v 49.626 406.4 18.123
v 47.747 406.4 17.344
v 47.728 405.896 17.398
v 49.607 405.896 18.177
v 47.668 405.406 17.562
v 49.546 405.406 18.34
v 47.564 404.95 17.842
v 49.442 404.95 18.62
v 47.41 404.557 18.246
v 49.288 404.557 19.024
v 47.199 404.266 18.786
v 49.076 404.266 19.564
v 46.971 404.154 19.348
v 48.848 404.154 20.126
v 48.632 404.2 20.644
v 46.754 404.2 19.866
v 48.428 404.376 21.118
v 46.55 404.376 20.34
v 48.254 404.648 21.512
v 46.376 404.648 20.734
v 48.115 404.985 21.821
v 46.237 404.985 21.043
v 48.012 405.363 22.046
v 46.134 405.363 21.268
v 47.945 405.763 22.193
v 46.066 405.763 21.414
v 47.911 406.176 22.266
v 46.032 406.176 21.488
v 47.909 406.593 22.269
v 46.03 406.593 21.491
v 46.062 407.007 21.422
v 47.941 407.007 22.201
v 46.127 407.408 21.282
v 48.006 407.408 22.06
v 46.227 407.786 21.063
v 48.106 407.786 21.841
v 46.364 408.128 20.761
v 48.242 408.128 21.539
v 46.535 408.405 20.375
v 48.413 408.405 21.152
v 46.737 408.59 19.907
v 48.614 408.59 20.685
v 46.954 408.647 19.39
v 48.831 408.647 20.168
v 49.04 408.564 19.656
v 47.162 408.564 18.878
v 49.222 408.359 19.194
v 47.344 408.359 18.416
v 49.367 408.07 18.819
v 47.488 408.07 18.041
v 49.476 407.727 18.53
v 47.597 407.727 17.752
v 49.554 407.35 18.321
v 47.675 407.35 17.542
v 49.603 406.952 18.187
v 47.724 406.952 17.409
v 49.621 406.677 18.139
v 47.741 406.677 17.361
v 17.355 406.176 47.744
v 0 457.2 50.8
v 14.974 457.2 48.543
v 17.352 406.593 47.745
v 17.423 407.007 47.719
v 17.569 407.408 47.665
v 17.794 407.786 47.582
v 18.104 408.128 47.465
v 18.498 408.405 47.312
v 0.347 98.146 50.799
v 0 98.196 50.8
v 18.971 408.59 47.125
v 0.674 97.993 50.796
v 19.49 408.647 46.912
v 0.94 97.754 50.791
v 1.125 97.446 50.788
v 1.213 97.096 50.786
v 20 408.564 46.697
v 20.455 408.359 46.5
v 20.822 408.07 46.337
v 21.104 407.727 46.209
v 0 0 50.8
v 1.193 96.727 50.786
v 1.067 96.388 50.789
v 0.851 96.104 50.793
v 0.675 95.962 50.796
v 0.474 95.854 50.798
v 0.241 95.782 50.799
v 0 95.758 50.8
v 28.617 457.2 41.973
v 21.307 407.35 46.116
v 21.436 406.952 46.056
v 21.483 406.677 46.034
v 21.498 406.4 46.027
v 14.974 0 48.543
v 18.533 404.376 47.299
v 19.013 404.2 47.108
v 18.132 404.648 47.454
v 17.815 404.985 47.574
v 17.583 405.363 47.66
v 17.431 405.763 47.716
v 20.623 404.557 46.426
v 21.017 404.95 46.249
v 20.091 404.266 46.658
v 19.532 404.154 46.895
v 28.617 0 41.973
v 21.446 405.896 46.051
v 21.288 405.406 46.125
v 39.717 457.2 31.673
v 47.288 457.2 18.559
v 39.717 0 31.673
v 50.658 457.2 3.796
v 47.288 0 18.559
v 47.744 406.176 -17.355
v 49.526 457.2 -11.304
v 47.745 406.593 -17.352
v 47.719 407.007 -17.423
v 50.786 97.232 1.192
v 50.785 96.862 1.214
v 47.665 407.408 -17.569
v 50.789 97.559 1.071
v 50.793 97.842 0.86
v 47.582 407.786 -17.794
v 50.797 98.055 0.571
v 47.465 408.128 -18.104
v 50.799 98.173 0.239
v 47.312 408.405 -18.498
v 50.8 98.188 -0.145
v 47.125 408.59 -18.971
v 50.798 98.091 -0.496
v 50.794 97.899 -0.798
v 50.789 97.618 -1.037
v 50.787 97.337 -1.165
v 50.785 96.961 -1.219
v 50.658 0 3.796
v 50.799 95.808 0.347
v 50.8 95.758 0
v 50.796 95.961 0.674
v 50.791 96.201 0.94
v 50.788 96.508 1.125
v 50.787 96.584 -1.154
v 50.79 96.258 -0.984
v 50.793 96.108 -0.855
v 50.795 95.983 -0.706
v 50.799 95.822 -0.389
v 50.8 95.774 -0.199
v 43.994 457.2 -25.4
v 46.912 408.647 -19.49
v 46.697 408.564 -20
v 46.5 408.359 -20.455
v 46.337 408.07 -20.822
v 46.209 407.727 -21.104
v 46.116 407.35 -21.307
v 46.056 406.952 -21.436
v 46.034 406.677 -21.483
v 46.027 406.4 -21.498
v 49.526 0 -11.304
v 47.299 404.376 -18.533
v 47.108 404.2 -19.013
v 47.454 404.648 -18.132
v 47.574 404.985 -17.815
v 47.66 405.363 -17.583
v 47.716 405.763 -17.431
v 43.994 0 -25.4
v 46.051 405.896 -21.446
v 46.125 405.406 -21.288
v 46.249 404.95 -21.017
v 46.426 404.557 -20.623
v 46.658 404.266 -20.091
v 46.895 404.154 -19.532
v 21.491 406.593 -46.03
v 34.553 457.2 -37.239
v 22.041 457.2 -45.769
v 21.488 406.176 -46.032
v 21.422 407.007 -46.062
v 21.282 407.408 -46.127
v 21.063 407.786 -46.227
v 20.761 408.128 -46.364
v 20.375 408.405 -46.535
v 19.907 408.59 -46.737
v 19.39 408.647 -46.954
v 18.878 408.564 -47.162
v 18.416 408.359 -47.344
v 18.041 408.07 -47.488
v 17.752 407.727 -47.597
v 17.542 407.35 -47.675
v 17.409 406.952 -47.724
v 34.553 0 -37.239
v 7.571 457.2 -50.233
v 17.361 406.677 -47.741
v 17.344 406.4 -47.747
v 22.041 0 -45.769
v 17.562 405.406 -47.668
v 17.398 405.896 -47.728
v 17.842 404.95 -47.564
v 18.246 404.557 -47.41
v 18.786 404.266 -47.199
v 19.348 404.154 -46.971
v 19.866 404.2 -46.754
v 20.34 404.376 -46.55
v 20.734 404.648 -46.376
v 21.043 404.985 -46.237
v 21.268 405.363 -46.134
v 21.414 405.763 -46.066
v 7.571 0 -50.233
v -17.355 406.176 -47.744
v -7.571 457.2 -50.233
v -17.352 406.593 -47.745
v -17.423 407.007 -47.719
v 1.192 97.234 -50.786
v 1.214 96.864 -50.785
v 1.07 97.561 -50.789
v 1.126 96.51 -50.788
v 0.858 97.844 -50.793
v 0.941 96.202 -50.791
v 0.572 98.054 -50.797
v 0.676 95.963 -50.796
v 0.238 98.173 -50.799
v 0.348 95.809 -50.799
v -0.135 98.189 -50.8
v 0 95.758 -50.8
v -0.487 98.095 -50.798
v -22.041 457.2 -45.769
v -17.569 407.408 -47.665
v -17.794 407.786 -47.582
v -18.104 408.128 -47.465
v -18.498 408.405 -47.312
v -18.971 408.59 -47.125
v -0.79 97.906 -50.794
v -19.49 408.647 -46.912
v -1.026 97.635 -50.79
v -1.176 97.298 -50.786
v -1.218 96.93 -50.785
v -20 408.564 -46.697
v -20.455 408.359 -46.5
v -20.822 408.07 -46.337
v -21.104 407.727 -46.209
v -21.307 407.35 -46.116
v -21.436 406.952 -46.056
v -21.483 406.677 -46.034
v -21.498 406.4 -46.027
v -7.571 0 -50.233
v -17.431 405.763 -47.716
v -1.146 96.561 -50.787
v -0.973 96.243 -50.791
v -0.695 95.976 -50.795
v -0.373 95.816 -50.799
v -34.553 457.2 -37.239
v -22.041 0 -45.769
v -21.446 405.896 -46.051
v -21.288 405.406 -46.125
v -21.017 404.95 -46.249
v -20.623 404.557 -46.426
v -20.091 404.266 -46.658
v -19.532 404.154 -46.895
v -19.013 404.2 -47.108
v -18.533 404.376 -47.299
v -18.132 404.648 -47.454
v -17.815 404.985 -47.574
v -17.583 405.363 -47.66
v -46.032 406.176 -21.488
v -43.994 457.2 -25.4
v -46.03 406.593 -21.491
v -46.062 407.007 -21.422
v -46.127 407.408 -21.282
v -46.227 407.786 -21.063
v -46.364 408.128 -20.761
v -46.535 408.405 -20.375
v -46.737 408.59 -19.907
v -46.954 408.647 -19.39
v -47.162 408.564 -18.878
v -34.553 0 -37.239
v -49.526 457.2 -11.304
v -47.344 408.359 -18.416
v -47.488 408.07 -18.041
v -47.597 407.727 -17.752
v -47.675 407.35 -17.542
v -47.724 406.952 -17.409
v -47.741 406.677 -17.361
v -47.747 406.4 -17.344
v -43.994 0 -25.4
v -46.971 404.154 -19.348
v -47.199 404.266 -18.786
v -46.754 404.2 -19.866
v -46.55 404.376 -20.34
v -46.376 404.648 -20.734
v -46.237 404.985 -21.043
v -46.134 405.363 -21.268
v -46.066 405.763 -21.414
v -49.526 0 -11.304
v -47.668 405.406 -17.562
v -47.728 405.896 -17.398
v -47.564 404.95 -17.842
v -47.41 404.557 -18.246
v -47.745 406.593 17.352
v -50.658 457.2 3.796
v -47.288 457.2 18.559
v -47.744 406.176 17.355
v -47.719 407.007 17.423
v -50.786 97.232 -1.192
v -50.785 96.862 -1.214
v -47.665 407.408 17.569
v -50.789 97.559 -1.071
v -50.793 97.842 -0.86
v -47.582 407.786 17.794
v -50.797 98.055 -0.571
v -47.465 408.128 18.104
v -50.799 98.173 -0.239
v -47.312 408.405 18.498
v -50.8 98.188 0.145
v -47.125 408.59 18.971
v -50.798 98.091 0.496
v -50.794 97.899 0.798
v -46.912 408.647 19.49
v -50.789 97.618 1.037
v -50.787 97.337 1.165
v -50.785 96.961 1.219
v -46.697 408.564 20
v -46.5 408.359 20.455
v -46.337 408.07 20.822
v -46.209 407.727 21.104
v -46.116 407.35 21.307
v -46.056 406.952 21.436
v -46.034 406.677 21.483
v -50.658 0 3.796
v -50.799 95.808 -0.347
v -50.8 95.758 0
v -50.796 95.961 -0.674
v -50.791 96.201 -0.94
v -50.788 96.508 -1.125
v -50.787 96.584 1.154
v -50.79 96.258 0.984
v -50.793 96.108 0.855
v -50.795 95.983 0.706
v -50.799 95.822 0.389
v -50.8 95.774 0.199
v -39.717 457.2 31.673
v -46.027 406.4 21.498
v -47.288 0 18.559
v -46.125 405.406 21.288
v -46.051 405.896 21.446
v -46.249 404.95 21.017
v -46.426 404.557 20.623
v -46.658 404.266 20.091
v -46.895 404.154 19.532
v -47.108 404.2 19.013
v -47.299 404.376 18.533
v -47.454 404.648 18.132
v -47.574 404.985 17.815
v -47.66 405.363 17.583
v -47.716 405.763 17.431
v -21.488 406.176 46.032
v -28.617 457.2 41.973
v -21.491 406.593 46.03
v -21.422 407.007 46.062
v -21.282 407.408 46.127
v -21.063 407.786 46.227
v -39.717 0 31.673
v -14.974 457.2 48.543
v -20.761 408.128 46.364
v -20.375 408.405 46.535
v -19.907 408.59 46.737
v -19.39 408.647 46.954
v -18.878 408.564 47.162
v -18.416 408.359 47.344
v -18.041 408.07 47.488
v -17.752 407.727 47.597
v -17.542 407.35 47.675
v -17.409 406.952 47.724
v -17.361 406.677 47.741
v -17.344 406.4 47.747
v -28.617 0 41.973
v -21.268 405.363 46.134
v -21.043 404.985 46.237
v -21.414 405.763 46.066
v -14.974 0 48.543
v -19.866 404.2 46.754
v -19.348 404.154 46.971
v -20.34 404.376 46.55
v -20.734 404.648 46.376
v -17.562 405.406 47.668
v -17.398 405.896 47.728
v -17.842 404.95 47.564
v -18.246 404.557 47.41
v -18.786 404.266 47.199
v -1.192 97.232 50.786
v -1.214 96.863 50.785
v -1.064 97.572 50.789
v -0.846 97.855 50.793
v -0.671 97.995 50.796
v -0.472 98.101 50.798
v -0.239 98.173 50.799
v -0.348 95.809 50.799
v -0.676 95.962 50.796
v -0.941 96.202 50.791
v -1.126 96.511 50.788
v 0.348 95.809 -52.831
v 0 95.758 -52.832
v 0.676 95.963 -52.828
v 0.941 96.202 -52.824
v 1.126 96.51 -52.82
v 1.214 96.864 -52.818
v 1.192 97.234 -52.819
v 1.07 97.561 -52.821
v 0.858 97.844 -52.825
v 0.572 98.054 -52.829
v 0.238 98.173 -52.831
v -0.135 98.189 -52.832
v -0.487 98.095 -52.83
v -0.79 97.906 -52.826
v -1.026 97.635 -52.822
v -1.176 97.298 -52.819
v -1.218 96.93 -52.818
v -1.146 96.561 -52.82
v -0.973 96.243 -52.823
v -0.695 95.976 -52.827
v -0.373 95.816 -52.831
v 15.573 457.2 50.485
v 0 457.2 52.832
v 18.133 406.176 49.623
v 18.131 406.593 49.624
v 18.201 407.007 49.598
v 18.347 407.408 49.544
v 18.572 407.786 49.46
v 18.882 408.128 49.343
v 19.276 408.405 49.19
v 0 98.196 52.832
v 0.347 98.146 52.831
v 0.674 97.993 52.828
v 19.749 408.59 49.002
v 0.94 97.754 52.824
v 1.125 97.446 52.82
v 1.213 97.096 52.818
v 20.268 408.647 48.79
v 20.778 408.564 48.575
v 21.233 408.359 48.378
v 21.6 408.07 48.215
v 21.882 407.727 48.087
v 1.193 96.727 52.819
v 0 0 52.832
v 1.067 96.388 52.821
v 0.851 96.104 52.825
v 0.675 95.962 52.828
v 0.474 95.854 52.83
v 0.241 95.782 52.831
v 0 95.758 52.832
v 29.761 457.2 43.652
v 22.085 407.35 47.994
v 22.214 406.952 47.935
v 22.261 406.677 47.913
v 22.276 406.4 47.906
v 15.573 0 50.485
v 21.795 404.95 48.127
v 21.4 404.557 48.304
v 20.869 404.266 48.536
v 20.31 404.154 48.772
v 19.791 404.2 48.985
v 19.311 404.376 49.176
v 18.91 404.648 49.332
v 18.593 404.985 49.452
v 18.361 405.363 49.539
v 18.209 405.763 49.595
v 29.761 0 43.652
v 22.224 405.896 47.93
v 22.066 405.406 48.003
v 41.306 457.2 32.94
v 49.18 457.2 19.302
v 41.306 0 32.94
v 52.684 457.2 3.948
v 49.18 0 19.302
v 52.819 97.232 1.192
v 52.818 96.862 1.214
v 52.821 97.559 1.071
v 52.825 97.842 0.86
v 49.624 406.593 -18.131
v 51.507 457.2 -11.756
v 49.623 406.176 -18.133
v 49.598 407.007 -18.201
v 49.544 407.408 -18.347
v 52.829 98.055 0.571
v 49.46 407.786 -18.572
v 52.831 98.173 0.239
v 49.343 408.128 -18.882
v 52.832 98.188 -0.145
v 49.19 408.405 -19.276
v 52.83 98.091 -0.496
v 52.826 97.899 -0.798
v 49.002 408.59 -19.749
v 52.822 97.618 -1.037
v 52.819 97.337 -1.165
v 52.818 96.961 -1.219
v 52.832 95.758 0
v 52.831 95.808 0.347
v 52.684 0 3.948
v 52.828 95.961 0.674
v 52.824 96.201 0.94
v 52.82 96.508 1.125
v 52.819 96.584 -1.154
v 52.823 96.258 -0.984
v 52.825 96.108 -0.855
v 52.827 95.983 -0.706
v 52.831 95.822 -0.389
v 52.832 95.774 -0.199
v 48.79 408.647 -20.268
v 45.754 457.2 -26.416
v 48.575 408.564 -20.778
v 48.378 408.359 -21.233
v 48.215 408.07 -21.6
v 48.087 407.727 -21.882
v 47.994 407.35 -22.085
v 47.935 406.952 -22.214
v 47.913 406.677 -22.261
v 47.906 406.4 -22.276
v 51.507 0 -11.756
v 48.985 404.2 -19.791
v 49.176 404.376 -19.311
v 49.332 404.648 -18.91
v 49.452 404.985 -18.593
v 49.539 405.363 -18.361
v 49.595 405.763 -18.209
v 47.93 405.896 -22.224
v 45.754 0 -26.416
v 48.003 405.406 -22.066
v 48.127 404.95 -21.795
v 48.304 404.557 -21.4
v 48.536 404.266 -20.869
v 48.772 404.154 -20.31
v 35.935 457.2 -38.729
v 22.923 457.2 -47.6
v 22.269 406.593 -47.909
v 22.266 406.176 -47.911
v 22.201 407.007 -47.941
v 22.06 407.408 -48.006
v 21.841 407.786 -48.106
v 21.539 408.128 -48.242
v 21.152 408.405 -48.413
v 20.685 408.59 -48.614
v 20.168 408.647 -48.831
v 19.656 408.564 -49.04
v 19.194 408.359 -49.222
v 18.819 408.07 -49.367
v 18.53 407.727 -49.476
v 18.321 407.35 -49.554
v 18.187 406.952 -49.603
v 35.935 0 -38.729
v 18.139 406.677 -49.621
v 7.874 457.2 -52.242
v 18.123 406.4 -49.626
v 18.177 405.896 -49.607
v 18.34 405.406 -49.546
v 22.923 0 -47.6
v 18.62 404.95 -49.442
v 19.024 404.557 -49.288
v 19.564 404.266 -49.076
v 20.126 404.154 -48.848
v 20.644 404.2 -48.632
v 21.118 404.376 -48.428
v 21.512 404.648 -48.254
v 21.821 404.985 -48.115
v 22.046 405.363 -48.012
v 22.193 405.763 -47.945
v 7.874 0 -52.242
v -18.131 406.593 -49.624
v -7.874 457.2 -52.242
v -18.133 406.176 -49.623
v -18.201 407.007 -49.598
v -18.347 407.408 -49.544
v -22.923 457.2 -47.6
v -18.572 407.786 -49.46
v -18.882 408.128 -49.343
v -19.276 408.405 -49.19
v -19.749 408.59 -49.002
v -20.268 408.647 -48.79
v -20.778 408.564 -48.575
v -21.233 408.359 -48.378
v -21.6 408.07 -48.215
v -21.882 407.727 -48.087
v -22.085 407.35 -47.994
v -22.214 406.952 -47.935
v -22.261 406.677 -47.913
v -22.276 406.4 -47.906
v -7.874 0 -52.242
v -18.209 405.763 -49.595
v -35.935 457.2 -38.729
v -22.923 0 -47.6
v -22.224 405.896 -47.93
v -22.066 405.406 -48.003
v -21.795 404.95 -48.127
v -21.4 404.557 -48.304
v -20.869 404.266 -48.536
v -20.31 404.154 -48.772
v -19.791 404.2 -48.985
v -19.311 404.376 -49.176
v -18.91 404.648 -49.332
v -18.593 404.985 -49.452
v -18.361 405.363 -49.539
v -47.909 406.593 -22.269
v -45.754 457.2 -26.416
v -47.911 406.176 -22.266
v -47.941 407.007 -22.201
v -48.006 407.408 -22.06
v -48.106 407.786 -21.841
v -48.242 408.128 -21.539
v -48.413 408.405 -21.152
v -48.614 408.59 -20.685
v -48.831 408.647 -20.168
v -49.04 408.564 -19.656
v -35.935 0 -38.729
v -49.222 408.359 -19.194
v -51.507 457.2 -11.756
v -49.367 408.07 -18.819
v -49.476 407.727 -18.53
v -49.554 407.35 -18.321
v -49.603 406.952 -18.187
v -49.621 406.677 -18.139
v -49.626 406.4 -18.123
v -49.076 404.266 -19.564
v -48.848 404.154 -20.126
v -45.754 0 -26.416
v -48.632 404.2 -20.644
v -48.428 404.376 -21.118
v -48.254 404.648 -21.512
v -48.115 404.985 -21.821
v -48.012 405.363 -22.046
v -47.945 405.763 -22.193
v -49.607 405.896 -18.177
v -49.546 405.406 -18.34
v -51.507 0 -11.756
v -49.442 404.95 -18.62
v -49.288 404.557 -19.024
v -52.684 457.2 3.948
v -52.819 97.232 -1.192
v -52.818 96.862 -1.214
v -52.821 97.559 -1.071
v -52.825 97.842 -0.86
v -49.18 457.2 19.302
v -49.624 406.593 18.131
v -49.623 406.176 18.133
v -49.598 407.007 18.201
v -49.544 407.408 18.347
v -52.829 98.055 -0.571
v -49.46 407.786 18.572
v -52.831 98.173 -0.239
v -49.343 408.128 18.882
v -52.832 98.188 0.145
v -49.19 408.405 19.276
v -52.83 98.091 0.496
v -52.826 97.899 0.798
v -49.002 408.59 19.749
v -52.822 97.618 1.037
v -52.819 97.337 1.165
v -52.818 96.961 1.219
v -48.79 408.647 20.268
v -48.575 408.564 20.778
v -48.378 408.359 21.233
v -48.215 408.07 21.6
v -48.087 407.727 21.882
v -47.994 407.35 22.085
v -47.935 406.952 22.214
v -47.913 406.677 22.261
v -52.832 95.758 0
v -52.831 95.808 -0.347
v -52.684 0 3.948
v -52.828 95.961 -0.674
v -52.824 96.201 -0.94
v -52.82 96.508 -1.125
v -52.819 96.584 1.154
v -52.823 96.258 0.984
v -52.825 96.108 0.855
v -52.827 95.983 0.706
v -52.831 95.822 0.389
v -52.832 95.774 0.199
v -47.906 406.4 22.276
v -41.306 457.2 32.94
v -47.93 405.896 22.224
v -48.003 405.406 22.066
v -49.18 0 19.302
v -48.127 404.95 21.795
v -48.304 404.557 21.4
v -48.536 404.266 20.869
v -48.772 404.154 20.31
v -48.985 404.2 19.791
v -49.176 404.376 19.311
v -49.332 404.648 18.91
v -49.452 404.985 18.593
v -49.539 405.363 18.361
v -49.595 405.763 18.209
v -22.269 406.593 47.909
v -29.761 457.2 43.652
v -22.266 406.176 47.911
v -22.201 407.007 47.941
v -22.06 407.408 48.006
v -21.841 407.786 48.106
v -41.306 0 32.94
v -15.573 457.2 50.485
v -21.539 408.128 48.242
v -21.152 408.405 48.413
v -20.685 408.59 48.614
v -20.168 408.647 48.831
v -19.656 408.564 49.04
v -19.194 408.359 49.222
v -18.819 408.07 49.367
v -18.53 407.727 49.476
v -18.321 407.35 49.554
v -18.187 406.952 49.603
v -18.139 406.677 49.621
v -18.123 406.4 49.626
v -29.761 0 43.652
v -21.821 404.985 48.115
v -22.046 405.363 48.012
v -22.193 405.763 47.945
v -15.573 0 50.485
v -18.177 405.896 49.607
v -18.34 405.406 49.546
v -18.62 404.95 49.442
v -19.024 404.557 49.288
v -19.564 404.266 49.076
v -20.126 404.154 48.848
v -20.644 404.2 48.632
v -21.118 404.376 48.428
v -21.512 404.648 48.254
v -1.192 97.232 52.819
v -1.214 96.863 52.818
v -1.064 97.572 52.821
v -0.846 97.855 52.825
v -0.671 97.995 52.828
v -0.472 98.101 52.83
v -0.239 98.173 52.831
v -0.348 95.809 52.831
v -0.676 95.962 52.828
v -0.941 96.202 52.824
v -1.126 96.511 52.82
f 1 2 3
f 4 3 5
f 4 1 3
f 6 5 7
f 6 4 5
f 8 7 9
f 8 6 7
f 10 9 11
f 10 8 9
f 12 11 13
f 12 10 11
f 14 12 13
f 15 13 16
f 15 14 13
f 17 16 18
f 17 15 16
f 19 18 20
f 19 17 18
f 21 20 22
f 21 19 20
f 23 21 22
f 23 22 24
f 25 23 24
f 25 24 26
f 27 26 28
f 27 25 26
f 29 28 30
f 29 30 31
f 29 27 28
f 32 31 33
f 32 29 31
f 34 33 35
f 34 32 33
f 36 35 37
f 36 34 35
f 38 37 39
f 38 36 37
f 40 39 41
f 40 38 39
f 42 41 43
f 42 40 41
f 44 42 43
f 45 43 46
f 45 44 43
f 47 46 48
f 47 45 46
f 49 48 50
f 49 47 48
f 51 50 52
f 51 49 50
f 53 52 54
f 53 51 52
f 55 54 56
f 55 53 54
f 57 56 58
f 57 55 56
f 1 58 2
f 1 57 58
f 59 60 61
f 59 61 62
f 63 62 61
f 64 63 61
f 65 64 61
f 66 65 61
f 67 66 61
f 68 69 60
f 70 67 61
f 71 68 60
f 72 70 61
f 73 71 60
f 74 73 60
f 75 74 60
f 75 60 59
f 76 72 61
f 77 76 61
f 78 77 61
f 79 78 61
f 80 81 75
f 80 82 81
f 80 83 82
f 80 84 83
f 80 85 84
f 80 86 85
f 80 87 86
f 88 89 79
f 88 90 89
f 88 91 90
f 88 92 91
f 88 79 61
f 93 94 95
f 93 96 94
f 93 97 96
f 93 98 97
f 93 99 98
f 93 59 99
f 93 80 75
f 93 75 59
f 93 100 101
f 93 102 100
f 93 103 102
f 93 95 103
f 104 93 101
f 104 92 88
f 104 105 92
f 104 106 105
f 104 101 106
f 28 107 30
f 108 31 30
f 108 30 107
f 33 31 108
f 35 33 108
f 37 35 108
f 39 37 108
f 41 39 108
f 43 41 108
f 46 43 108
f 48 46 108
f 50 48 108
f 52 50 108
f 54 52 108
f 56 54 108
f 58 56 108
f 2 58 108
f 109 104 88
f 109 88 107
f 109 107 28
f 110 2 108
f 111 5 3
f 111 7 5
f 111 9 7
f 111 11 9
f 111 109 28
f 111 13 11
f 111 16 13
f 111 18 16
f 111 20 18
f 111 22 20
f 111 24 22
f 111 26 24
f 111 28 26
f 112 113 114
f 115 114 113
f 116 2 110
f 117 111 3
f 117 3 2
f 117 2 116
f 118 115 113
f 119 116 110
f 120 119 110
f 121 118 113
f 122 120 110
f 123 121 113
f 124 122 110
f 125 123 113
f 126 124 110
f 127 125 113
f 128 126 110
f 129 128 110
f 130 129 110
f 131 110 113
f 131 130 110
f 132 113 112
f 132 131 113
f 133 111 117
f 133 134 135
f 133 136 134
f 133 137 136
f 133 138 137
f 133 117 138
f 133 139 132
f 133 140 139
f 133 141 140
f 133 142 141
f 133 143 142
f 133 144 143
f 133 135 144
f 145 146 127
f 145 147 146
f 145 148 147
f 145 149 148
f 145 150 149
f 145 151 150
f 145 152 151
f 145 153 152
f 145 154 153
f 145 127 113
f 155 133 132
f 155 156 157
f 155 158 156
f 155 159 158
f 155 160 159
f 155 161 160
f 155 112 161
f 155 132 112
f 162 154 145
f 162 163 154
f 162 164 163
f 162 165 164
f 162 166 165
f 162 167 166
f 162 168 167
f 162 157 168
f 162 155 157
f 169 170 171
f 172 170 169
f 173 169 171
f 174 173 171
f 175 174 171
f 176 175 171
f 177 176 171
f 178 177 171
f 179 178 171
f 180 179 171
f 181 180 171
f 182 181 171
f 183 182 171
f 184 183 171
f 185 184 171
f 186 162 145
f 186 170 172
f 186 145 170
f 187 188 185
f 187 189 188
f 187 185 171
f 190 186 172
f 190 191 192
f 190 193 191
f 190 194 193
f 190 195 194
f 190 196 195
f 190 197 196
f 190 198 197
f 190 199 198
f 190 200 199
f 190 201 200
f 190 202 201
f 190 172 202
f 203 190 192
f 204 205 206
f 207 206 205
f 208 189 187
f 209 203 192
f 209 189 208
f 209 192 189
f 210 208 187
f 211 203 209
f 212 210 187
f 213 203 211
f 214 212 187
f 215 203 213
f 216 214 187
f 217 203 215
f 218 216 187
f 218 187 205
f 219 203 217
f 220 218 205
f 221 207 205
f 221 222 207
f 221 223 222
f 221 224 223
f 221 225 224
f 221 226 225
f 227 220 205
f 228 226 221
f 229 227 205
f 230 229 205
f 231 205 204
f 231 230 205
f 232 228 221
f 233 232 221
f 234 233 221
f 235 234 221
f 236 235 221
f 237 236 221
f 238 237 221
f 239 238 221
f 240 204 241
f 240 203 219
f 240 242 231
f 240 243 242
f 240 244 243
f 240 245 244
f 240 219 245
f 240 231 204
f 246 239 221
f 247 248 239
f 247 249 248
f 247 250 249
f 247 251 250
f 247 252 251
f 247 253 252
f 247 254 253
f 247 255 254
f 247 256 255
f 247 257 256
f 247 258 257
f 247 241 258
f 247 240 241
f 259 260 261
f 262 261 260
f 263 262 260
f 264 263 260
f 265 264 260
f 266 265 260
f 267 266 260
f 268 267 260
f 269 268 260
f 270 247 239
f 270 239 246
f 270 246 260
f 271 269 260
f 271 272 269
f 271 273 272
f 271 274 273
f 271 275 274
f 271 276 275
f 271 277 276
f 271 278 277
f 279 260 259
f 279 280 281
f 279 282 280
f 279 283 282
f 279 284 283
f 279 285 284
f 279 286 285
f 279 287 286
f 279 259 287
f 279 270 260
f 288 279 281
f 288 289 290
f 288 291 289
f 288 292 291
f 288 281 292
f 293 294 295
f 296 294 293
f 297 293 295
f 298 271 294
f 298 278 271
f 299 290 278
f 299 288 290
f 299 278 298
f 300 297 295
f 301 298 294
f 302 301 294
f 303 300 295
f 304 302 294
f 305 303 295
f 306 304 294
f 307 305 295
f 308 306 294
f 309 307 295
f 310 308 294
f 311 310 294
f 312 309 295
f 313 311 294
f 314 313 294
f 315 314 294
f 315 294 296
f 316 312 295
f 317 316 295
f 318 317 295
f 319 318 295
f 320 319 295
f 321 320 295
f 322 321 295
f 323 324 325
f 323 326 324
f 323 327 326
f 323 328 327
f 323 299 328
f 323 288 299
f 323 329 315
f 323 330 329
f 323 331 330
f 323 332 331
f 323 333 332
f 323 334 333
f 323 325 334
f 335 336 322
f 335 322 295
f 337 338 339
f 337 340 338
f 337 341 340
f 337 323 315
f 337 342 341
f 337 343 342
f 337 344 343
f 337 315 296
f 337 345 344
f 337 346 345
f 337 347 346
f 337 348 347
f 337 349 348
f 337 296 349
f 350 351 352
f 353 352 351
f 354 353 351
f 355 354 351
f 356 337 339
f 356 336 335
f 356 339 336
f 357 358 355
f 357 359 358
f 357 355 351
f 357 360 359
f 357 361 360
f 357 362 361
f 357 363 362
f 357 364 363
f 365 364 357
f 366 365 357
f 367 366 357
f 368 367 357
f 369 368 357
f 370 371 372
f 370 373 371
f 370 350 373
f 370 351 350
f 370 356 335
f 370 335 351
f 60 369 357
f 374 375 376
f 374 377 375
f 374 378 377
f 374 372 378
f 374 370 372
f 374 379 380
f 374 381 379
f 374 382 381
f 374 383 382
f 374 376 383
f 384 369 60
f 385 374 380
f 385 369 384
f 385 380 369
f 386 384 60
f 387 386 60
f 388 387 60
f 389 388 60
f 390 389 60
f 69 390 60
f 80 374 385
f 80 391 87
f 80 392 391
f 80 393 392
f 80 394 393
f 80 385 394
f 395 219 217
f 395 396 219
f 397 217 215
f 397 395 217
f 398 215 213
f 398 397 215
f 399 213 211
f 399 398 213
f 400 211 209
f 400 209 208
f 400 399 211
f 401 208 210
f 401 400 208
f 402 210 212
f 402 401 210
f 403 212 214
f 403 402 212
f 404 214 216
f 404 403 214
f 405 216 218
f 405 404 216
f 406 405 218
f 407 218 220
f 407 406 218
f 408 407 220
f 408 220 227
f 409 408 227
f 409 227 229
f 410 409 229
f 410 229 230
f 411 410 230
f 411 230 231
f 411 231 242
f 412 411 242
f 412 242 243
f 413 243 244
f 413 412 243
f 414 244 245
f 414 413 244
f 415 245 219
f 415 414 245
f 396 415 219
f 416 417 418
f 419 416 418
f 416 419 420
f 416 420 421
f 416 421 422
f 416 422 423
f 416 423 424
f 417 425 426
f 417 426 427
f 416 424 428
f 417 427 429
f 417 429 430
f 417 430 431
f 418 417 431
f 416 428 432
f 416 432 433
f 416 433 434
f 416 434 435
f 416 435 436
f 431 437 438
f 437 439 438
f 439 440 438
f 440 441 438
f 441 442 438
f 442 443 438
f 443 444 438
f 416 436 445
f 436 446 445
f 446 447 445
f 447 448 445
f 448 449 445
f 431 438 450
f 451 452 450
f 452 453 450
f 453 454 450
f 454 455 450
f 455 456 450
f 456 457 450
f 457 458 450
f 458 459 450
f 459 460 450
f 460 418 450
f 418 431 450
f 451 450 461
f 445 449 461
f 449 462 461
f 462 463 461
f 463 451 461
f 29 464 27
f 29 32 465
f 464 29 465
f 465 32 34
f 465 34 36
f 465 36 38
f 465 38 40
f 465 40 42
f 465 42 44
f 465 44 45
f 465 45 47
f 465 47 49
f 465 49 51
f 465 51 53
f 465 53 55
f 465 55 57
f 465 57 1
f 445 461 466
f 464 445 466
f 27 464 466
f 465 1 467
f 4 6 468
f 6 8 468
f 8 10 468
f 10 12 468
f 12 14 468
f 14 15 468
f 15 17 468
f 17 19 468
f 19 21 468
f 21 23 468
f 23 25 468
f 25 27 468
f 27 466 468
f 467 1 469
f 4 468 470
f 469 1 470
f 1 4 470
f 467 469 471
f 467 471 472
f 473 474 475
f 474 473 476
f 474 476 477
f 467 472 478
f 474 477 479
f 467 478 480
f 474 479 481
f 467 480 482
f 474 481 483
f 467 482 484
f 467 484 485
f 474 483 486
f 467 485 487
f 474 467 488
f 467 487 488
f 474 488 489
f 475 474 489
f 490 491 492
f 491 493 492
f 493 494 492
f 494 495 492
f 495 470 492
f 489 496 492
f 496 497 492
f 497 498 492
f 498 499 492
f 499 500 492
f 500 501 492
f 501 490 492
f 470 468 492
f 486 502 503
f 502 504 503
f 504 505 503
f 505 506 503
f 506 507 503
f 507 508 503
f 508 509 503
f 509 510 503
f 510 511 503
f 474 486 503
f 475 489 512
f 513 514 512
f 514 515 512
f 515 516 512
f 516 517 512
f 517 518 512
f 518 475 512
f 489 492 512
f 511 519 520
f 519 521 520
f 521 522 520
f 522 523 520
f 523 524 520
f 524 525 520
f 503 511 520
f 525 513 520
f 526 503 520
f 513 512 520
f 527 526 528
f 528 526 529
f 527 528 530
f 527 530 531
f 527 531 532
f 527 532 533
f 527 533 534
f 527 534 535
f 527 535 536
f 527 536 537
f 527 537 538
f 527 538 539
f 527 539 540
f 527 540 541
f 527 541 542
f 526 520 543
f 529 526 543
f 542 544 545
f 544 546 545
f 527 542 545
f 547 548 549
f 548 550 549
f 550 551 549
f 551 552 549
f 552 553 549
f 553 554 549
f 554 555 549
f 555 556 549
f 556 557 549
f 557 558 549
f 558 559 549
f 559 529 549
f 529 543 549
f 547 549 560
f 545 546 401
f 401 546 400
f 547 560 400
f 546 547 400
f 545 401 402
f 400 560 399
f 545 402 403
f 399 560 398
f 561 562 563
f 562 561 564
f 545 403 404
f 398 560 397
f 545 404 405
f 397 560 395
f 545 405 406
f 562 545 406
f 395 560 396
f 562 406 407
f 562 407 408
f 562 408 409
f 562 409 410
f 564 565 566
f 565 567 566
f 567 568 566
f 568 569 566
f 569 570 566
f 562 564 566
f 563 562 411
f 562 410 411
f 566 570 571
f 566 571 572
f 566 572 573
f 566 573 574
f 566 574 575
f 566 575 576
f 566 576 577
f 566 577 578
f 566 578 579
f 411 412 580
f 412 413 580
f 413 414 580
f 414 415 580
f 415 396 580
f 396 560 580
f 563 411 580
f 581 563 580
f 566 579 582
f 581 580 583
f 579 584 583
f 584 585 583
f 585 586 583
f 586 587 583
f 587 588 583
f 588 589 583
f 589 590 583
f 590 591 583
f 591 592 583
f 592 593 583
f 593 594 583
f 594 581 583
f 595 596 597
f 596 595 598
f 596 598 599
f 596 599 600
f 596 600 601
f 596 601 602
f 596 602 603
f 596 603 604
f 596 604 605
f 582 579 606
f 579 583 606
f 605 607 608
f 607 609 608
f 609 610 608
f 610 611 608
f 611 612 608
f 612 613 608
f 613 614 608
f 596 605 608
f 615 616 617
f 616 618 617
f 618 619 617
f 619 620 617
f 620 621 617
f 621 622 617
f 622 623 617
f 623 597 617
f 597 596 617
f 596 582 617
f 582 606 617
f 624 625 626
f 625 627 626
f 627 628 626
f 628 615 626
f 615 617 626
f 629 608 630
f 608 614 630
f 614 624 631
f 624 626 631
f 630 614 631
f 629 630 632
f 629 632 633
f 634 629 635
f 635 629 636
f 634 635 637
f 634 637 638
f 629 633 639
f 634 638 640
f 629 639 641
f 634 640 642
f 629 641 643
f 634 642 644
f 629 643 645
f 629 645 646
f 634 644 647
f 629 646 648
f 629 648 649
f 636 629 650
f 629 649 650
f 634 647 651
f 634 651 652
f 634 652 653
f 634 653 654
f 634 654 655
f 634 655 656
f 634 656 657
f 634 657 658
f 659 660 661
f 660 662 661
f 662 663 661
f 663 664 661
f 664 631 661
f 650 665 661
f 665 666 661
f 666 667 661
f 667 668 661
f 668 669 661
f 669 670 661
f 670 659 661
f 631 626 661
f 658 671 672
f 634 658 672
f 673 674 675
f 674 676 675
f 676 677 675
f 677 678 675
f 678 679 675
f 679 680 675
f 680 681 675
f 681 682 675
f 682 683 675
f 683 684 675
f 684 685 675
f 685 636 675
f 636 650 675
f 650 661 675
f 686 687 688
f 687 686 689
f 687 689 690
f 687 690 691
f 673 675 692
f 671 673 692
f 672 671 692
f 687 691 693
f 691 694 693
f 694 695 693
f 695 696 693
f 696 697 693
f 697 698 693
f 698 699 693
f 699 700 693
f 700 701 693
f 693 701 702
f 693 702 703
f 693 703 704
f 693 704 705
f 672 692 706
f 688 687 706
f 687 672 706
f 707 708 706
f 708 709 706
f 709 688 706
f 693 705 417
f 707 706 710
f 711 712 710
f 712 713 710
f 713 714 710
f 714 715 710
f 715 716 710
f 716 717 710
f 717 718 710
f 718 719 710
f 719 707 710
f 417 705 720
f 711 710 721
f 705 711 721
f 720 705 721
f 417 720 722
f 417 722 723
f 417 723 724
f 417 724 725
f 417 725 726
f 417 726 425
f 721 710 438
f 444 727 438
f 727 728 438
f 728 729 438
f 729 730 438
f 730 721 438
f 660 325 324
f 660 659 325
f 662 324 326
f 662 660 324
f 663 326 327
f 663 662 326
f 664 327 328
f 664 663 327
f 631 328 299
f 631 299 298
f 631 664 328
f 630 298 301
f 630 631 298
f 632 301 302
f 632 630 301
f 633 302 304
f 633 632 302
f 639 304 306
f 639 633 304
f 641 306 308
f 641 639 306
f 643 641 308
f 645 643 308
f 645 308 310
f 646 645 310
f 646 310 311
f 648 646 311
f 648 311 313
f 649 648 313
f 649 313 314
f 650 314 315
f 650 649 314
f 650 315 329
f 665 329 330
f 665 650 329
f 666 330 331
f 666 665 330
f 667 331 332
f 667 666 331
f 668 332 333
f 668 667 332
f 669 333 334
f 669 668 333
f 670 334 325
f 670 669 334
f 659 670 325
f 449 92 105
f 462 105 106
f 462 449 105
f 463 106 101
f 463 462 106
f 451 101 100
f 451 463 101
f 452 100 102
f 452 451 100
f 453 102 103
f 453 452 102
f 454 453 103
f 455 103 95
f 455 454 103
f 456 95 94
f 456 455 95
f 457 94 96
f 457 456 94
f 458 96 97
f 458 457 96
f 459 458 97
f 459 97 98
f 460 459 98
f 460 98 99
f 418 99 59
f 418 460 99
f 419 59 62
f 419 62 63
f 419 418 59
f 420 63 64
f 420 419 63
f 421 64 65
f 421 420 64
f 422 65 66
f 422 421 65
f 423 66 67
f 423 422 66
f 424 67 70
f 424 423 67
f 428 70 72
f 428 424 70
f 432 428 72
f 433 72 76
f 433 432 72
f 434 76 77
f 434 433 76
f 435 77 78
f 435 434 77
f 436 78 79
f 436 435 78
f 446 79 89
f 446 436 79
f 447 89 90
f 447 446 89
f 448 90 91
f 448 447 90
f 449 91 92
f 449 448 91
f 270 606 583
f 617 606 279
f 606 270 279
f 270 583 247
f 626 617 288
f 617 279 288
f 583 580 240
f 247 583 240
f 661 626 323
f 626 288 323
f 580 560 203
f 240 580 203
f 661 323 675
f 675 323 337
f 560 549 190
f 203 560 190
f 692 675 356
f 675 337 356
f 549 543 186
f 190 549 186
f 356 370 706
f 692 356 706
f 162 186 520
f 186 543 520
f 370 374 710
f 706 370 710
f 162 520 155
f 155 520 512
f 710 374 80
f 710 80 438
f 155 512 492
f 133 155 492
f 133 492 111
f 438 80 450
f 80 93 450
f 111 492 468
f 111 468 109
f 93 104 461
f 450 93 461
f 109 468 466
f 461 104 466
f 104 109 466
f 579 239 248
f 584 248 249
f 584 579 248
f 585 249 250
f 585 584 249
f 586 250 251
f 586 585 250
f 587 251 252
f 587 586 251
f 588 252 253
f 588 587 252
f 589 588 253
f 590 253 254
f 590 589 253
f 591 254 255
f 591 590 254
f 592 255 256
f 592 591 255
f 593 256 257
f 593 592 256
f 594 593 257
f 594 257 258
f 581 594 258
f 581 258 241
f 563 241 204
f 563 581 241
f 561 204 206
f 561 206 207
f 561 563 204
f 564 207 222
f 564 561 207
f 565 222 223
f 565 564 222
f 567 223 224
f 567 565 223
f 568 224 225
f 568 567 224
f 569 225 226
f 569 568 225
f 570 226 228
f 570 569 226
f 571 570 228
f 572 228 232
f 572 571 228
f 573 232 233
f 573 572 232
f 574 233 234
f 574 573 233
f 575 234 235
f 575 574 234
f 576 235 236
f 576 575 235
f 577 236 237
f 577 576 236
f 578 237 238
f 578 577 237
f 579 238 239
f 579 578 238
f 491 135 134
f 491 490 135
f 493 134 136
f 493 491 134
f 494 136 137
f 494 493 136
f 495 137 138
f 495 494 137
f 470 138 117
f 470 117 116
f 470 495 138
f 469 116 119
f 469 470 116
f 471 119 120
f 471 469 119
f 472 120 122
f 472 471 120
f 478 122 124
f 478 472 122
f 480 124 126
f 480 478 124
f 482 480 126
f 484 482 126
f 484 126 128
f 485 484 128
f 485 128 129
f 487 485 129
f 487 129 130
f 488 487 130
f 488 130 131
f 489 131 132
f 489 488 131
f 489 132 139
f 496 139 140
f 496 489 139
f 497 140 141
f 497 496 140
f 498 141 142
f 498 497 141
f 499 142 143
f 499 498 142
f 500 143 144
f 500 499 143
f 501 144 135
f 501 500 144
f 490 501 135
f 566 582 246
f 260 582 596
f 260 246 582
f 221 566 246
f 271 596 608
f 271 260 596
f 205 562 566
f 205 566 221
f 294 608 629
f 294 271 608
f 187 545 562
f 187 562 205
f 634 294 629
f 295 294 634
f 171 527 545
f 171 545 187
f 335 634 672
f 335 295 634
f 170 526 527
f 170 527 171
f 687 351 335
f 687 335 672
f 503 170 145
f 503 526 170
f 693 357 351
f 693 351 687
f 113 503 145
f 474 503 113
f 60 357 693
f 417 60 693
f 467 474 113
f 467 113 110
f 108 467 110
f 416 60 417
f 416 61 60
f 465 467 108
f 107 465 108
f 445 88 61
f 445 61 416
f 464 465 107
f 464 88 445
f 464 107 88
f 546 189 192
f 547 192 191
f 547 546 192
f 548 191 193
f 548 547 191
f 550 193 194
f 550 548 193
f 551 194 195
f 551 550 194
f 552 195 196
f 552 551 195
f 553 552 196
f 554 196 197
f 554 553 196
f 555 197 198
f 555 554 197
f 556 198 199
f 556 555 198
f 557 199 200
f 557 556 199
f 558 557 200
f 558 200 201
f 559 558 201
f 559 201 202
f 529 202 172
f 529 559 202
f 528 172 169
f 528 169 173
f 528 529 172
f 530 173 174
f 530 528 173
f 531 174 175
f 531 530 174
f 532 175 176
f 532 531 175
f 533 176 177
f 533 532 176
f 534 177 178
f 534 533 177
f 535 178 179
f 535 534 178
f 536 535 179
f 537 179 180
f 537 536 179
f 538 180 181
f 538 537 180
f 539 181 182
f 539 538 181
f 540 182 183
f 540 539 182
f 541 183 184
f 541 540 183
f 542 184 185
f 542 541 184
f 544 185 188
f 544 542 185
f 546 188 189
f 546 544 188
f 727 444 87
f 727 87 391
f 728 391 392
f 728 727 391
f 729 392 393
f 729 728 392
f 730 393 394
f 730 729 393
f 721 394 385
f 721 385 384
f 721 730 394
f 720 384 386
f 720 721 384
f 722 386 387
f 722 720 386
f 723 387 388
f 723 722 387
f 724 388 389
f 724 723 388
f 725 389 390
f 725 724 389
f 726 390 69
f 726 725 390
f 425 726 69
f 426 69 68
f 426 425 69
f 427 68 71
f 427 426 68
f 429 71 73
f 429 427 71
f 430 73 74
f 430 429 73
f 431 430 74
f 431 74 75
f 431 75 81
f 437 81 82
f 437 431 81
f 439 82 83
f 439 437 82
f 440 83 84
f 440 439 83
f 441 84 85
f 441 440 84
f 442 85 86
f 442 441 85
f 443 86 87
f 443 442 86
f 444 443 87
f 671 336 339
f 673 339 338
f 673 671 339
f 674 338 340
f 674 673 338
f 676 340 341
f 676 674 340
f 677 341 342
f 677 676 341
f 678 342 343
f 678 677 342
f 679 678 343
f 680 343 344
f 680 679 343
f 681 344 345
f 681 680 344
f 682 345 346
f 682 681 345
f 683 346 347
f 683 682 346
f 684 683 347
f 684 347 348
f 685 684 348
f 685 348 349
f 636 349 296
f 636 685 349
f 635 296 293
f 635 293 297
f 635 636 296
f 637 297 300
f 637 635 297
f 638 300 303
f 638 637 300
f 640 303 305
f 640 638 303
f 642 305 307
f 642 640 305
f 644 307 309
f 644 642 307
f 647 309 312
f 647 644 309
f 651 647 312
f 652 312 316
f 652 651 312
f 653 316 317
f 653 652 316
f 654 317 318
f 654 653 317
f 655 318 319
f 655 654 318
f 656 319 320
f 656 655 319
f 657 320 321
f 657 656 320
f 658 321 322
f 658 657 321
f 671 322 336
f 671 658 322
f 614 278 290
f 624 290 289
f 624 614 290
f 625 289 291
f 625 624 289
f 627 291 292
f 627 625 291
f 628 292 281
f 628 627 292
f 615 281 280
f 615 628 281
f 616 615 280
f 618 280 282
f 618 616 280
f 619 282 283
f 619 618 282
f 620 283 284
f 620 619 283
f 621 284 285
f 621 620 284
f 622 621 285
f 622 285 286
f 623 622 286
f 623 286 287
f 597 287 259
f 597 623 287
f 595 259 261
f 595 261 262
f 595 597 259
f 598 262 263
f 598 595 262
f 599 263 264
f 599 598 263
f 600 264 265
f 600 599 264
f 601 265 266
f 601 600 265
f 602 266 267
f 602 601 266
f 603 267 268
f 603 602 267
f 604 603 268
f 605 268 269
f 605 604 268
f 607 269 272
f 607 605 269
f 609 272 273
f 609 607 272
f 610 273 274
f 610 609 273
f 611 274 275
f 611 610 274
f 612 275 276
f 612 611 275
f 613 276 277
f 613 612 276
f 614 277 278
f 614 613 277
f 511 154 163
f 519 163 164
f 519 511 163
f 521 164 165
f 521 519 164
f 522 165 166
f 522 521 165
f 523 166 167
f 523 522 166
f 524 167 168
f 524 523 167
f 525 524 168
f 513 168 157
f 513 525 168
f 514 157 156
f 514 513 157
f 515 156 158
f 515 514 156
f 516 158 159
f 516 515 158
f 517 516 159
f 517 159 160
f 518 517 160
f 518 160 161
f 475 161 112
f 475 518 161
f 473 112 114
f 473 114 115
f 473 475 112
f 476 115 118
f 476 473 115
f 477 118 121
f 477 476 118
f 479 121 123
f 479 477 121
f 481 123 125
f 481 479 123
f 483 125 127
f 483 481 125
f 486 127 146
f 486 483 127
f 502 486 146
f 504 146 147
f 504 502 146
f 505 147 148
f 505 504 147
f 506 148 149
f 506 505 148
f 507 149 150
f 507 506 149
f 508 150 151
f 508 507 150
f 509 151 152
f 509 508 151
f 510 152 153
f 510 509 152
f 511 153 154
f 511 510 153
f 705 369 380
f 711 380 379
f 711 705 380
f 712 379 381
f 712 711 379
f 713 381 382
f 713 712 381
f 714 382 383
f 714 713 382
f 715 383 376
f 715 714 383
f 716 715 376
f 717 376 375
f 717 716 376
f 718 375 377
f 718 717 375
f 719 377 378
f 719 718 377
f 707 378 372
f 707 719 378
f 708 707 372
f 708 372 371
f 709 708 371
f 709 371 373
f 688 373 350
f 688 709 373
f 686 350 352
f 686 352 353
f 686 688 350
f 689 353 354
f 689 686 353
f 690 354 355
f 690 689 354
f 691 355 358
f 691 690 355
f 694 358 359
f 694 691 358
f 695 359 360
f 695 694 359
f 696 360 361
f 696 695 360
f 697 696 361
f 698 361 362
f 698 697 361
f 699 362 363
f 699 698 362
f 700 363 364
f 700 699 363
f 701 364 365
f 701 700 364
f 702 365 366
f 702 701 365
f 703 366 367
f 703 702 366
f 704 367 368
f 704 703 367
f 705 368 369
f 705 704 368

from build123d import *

# Parameters (mm, degrees)
SKETCH1_R           = 52.832
SKETCH1_R_2         = 50.8
BOSS_EXTRUDE1_DEPTH = 457.2
CIRPATTERN1_COUNT   = 4
CIRPATTERN2_COUNT   = 8


with BuildPart() as part:
    # Sketch1 → Boss-Extrude1 (new body)
    with BuildSketch(Plane(origin=(0, 0, 0), x_dir=(1, 0, 0), z_dir=(0, 1, 0))):
        with Locations(Location((0, 0, 0), (0, 0, 270))):
            Circle(SKETCH1_R)
        with Locations(Location((0, 0, 0), (0, 0, 270))):
            Circle(SKETCH1_R_2, mode=Mode.SUBTRACT)
    extrude(amount=BOSS_EXTRUDE1_DEPTH)

    # Sketch4 → #2 Clearance Hole1 (revolve, cut)
    with BuildSketch(Plane(origin=(0, 96.9772, 52.832), x_dir=(0, -1, 0), z_dir=(1, 0, 0))):
        Polygon((0, 0), (0, 55.596569267), (1.2192, 54.864), (1.2192, 0), align=None)
    f_2_clearance_hole1 = revolve(axis=Axis((0, 96.9772, 59.182), (0, 0, -1)), mode=Mode.SUBTRACT)

    # Sketch6 → #8 Clearance Hole1 (revolve, cut)
    with BuildSketch(Plane(origin=(20.217931099, 406.4, 48.810403462), x_dir=(0.9238795325112864, 0, -0.38268343236509056), z_dir=(0, 1, 0))):
        Polygon((0, 0), (0, 56.214674586), (2.2479, 54.864), (2.2479, 0), align=None)
    f_8_clearance_hole1 = revolve(axis=Axis((22.647970894, 406.4, 54.677038493), (-0.38268343236509056, 0, -0.9238795325112865)), mode=Mode.SUBTRACT)

    # CirPattern1: #2 Clearance Hole1 ×4 about axis
    cirpattern1_axis = Axis((0, 457.2, 0), (0, -1, 0))
    for i in range(1, CIRPATTERN1_COUNT):
        add(f_2_clearance_hole1.rotate(cirpattern1_axis, i * 360 / CIRPATTERN1_COUNT), mode=Mode.SUBTRACT)

    # CirPattern2: #8 Clearance Hole1 ×8 about axis
    cirpattern2_axis = Axis((0, 457.2, 0), (0, -1, 0))
    for i in range(1, CIRPATTERN2_COUNT):
        add(f_8_clearance_hole1.rotate(cirpattern2_axis, i * 360 / CIRPATTERN2_COUNT), mode=Mode.SUBTRACT)


solid = part.part
